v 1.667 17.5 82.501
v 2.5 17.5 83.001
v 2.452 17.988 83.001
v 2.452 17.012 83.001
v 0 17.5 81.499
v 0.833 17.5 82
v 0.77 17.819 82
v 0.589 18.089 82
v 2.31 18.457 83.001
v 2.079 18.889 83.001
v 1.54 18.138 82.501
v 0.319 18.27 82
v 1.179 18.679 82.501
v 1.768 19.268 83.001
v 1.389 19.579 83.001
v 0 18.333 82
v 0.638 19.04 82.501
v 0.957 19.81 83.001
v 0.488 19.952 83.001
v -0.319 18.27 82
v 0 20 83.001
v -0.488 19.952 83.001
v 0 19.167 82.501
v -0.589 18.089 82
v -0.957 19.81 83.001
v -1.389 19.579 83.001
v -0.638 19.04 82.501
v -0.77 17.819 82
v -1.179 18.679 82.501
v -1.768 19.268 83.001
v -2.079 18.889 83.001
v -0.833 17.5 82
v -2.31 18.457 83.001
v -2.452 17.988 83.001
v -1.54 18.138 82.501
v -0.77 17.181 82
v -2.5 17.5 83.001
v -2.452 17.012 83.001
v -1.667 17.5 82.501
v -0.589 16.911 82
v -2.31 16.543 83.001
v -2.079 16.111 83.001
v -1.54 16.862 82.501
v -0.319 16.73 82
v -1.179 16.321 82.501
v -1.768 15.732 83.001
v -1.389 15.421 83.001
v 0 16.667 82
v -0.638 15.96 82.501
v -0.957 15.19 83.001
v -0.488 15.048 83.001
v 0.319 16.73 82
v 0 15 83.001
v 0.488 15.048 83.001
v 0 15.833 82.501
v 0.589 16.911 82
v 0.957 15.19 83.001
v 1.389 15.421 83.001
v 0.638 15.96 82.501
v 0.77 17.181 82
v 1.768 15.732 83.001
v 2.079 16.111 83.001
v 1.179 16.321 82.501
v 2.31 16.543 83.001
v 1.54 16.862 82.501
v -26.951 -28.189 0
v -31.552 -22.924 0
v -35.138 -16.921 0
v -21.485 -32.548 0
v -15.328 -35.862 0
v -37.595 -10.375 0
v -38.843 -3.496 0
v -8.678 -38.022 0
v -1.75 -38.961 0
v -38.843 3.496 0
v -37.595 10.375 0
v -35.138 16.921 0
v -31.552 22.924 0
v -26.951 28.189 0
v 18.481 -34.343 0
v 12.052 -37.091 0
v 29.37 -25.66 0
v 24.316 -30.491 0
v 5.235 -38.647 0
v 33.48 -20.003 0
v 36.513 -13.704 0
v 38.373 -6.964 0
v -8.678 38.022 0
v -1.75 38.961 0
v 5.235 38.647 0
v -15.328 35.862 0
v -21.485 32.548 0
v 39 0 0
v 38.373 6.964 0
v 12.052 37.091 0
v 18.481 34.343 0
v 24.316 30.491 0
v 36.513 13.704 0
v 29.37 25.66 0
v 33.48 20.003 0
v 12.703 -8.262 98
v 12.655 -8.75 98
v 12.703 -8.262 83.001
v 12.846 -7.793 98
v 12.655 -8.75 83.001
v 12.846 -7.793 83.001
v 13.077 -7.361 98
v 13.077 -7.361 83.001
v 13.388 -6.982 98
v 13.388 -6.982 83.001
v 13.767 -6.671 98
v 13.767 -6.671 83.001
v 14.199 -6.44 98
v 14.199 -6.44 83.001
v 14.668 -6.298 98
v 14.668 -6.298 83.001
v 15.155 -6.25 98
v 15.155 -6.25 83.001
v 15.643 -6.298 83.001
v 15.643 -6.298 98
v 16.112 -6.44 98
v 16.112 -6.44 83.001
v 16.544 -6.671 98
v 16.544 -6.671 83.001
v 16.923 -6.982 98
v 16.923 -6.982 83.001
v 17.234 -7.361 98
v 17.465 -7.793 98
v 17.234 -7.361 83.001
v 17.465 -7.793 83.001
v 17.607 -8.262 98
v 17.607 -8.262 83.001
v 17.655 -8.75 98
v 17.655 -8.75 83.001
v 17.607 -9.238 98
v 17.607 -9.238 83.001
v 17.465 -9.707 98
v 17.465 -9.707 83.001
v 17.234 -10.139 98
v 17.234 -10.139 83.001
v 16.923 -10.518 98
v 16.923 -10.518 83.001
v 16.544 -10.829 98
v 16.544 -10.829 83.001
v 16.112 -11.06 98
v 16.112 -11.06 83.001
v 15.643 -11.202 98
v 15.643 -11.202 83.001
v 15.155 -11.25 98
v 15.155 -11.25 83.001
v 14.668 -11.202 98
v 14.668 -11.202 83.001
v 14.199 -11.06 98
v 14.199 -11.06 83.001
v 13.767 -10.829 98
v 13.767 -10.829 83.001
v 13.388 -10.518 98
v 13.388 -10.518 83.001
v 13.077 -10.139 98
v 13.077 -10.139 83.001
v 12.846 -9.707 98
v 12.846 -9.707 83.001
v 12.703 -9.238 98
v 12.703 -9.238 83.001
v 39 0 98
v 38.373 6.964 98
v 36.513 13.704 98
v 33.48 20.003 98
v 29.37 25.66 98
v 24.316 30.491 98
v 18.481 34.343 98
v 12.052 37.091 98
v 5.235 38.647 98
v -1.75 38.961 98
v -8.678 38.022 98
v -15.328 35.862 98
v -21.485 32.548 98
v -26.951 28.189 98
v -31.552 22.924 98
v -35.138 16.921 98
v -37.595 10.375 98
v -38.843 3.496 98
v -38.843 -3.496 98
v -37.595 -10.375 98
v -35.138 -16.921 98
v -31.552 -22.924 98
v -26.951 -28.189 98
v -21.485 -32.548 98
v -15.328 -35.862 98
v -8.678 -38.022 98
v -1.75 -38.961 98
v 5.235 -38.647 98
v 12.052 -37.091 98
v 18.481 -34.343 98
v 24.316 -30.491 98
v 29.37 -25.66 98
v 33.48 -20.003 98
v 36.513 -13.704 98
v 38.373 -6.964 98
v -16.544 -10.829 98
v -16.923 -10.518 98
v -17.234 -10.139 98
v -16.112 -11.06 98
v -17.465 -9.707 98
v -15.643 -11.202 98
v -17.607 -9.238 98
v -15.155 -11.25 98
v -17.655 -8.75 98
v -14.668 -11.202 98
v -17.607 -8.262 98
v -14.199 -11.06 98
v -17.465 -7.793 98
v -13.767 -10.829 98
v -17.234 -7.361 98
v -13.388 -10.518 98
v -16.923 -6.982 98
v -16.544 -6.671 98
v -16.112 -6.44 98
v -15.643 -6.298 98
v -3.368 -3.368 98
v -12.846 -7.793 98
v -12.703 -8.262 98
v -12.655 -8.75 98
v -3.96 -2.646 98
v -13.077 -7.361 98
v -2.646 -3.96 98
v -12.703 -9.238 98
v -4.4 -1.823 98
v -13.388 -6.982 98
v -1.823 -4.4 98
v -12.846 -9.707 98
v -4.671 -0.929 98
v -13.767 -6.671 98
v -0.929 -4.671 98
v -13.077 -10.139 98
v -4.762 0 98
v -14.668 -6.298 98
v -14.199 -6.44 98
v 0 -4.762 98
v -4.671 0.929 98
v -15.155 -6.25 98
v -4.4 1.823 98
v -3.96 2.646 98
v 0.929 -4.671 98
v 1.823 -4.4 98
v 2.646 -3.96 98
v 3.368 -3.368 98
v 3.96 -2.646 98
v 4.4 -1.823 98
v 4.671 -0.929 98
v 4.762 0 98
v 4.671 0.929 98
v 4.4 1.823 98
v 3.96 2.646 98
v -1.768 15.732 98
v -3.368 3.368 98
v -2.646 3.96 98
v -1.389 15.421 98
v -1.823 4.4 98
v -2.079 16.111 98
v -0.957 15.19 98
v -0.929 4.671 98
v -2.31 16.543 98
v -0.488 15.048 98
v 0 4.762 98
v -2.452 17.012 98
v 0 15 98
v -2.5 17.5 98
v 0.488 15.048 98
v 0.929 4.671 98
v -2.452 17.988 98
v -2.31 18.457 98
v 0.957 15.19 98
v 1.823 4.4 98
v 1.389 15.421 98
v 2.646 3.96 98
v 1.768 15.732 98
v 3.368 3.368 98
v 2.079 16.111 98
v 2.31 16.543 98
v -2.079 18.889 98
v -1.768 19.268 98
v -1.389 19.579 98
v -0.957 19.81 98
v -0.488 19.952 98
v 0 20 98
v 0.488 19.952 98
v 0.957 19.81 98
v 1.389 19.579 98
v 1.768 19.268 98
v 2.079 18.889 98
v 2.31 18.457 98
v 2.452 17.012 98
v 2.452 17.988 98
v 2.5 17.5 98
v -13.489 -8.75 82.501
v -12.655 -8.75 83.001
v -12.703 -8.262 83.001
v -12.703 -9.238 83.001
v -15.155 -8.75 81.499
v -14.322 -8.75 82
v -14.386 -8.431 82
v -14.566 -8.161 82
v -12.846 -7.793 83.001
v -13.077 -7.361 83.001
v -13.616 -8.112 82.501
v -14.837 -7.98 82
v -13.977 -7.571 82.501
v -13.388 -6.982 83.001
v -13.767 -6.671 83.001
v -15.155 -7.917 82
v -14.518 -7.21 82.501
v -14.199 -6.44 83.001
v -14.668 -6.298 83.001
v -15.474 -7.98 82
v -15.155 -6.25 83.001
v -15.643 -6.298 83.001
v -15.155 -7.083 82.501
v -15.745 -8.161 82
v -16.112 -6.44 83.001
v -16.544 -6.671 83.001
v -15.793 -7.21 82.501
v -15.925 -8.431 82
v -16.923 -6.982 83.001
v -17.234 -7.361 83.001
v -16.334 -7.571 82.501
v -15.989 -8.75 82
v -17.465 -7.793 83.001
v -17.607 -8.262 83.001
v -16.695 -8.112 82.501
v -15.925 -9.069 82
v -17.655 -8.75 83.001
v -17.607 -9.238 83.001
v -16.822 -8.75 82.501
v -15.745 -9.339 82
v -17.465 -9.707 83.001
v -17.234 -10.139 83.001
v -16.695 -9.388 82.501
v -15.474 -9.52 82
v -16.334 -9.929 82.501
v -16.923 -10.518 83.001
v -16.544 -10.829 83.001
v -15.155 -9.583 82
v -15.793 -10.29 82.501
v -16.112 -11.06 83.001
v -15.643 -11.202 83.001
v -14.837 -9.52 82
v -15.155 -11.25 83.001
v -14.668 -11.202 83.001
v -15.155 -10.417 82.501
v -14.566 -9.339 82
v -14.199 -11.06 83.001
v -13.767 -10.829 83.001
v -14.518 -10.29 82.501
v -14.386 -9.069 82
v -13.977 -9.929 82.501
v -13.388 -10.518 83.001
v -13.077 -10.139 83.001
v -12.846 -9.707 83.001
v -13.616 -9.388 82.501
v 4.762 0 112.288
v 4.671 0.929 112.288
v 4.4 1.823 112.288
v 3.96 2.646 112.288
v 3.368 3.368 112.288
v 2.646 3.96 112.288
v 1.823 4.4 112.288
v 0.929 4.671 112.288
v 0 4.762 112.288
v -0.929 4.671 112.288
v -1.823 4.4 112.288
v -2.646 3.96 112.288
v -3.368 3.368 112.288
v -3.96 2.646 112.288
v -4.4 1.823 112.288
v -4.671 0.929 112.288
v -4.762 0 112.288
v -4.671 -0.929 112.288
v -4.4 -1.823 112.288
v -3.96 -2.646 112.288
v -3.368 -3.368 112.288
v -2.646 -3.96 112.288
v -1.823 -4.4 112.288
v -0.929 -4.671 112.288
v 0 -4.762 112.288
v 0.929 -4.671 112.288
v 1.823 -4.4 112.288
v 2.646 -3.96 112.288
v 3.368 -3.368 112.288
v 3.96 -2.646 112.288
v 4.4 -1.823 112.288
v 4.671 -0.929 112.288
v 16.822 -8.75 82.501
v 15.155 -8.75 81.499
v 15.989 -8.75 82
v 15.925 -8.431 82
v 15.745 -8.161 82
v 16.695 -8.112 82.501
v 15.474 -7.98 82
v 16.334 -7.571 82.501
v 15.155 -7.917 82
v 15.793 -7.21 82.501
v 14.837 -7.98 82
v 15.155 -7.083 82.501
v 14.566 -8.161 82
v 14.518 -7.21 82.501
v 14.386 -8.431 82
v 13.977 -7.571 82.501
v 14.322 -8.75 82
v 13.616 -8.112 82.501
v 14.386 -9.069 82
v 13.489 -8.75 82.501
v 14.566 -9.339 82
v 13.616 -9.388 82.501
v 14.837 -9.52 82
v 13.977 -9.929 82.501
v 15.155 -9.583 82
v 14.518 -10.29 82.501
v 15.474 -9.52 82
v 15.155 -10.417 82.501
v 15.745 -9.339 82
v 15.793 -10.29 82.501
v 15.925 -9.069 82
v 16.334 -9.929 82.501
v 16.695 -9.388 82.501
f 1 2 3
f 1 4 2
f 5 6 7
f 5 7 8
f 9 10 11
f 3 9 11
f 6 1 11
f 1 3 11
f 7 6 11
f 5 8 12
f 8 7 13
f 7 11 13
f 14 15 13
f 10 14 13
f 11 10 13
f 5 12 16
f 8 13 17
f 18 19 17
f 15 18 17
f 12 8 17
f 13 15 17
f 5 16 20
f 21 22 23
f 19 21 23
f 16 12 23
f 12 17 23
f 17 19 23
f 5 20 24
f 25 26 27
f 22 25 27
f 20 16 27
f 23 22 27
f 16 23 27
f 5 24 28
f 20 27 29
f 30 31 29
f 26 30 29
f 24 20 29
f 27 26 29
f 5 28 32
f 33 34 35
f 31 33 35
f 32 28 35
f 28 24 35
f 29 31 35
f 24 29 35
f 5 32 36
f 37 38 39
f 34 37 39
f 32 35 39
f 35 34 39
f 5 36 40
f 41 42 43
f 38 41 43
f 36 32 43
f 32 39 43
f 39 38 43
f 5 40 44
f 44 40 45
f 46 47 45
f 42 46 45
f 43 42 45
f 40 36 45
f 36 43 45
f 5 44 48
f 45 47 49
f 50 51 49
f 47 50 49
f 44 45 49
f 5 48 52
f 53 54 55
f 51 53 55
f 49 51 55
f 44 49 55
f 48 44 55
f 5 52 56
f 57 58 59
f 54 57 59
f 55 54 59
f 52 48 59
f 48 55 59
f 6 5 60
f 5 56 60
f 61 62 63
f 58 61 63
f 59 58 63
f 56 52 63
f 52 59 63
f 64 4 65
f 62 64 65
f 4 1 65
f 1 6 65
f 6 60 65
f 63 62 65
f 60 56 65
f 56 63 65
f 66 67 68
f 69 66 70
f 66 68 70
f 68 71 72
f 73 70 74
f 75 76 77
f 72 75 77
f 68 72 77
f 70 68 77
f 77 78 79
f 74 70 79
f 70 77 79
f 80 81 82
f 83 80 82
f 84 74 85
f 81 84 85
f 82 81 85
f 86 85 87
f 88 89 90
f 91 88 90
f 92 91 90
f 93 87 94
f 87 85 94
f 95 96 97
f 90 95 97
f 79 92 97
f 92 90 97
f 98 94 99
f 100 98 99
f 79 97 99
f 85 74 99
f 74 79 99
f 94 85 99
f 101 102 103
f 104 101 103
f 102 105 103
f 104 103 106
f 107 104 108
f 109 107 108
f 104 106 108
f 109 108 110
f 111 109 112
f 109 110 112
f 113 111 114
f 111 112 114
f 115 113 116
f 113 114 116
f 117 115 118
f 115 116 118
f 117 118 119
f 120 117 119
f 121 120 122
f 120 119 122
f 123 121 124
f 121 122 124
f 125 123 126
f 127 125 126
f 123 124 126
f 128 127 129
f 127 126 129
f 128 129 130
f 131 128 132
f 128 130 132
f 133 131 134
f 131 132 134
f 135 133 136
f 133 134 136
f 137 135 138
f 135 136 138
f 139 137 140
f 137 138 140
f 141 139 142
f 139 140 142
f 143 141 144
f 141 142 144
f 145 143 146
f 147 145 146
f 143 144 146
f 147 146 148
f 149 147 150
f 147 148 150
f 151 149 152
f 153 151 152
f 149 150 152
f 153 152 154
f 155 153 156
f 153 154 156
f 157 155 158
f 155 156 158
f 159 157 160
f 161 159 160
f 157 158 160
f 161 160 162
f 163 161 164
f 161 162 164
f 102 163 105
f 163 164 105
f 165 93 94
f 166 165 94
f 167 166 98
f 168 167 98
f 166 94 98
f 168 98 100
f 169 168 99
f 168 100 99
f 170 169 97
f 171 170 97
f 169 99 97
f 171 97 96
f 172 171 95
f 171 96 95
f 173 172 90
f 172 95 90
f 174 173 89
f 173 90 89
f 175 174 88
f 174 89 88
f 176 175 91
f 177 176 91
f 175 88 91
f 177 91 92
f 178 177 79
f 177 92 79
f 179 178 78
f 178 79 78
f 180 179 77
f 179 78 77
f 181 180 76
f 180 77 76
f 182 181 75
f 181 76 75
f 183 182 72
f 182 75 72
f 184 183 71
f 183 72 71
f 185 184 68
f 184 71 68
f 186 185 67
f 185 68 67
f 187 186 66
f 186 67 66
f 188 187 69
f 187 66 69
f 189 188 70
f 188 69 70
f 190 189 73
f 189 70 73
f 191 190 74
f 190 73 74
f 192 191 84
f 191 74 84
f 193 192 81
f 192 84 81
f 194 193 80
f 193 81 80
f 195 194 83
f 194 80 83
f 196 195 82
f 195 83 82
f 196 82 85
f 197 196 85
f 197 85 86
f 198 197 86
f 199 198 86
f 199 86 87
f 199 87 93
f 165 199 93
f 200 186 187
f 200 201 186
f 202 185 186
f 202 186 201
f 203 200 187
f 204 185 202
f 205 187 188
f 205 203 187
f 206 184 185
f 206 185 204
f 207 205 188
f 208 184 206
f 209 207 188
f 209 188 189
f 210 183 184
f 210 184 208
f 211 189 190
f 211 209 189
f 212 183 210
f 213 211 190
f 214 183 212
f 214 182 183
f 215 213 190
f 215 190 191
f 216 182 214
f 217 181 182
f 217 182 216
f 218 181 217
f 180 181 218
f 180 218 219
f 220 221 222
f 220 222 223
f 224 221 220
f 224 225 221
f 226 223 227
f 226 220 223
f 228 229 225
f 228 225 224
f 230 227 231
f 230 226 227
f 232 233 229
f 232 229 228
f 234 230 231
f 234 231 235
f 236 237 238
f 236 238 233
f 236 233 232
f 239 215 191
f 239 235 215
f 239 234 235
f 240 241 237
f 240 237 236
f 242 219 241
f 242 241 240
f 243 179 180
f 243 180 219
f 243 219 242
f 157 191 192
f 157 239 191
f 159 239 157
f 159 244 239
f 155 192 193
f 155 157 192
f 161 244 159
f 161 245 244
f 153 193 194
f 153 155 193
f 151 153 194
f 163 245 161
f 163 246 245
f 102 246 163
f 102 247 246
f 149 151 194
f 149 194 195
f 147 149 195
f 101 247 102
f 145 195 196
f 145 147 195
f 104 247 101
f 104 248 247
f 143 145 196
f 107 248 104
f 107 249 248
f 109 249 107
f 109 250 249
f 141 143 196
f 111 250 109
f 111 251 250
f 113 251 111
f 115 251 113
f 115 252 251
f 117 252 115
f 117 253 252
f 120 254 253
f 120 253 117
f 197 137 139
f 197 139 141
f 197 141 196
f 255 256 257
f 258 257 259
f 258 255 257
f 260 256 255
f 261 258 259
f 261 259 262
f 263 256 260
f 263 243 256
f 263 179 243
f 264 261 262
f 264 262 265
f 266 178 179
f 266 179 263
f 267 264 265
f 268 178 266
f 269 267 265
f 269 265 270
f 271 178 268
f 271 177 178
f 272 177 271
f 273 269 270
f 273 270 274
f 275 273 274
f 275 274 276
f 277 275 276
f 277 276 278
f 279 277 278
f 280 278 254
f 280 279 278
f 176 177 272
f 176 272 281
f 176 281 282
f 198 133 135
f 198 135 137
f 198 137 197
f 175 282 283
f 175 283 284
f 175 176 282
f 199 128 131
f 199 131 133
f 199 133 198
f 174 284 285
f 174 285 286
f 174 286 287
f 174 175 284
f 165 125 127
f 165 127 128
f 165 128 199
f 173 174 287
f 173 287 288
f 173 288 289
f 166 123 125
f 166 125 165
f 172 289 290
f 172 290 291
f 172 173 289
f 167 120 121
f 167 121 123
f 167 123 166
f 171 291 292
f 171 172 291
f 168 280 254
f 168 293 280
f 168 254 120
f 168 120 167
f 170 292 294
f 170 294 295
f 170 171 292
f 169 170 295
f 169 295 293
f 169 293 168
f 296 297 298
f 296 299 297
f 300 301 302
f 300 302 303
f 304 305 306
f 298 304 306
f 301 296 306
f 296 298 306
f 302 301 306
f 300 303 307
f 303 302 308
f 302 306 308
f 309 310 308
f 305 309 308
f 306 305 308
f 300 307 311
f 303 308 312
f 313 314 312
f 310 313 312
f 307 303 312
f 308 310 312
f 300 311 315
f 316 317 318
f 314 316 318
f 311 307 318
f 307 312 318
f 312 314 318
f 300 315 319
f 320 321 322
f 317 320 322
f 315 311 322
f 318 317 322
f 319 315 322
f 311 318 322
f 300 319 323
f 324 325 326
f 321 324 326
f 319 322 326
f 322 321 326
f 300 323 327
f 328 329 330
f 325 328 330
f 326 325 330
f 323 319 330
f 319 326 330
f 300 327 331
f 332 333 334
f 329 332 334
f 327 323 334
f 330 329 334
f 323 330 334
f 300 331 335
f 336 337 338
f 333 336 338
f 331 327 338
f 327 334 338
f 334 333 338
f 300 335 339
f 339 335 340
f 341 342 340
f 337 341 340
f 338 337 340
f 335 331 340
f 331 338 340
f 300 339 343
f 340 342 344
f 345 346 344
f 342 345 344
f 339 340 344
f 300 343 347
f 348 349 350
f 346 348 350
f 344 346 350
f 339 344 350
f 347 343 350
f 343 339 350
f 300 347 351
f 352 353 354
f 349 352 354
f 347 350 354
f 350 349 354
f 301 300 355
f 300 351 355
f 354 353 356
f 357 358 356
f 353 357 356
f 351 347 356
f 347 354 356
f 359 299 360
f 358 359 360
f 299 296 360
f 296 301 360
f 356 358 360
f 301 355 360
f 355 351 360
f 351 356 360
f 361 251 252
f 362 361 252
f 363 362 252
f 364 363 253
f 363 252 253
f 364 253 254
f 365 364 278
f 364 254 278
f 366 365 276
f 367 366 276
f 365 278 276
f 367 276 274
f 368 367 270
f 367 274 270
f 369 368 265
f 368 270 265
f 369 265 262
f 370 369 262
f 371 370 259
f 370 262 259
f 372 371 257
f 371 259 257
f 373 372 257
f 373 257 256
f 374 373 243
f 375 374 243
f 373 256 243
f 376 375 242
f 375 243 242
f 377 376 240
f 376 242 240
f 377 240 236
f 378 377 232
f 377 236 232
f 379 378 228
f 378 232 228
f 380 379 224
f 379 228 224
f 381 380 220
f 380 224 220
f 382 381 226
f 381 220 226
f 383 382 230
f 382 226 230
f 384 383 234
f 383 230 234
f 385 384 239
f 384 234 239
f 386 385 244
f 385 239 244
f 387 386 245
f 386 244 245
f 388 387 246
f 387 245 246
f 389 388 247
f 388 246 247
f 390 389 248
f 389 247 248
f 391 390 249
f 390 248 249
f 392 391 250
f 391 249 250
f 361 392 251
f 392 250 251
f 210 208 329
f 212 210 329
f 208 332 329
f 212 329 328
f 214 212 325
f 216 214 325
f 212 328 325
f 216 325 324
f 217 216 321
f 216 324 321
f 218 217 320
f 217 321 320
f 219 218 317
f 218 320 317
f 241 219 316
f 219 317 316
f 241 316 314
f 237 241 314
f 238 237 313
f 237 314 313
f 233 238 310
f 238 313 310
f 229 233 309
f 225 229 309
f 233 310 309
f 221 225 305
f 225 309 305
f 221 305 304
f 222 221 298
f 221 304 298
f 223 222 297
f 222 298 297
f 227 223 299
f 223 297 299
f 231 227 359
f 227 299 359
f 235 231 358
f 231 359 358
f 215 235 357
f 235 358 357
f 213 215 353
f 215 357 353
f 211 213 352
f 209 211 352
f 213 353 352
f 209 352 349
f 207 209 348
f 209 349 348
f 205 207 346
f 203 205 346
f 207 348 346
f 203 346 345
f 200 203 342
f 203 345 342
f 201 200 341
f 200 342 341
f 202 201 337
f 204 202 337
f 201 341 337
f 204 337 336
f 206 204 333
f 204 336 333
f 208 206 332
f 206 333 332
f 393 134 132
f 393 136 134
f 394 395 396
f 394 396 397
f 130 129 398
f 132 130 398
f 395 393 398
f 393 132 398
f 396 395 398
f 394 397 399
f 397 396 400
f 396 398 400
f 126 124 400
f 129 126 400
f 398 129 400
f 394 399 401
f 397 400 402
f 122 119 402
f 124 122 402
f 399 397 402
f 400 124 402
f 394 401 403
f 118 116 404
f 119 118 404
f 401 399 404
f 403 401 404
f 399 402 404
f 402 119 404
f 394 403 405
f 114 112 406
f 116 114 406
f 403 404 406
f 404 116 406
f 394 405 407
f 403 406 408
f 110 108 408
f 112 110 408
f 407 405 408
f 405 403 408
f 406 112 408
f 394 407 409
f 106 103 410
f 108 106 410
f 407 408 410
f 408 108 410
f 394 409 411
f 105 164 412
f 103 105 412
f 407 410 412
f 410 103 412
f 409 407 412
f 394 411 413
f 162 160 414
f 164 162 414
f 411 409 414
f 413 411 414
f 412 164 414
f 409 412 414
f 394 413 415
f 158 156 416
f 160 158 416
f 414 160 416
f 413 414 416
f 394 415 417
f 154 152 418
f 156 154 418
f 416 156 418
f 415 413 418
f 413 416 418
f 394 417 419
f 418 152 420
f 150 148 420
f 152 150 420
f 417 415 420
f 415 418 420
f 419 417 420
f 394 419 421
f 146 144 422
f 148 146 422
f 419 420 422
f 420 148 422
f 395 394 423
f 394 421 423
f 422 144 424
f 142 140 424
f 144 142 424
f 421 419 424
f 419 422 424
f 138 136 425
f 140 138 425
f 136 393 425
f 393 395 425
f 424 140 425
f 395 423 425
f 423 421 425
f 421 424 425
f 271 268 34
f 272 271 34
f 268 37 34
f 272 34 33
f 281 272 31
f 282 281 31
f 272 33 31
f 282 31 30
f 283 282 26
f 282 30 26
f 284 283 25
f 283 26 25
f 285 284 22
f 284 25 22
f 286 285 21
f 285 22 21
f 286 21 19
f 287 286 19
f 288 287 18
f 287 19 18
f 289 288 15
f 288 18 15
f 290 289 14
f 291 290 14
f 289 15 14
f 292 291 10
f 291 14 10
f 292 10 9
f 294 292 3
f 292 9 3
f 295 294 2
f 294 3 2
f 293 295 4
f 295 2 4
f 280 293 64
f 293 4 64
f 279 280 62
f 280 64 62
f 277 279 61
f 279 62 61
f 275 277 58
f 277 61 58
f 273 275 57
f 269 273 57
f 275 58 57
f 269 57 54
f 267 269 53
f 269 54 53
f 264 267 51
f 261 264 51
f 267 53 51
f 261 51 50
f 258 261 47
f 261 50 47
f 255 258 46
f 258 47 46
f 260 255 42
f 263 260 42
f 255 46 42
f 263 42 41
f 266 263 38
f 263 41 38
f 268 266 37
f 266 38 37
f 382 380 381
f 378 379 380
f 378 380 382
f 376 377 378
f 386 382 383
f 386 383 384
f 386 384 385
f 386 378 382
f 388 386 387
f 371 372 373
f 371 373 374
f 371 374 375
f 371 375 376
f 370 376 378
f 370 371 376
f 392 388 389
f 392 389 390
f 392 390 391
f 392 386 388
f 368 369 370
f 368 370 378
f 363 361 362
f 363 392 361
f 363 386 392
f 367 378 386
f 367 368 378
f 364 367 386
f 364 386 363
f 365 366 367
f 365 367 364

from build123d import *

# Parameters (mm, degrees)
SKETCH1_R                 = 39
BOSS_EXTRUDE1_DEPTH       = 98
SKETCH2_R                 = 4.7625
BOSS_EXTRUDE2_DEPTH       = 14.2875
M6X1_0_TAPPED_HOLE1_D     = 5
M6X1_0_TAPPED_HOLE1_DEPTH = 14.9987
M6X1_0_TAPPED_HOLE1_TIP   = 1.502151548


with BuildPart() as part:
    # Sketch1 → Boss-Extrude1 (new body)
    with BuildSketch(Plane.XY):
        Circle(SKETCH1_R)
    extrude(amount=BOSS_EXTRUDE1_DEPTH)

    # Sketch2 → Boss-Extrude2 (add)
    with BuildSketch(Plane.XY.offset(98)):
        Circle(SKETCH2_R)
    extrude(amount=BOSS_EXTRUDE2_DEPTH)

    # M6x1.0 Tapped Hole1
    with Locations(Plane.XY.offset(98)):
        with Locations((0, 17.5), (15.155444566, -8.75), (-15.155444566, -8.75)):
            Hole(M6X1_0_TAPPED_HOLE1_D / 2, depth=M6X1_0_TAPPED_HOLE1_DEPTH)
            with Locations((0, 0, -(M6X1_0_TAPPED_HOLE1_DEPTH + M6X1_0_TAPPED_HOLE1_TIP / 2))):  # 118° drill point
                Cone(0, M6X1_0_TAPPED_HOLE1_D / 2, M6X1_0_TAPPED_HOLE1_TIP, mode=Mode.SUBTRACT)


solid = part.part
